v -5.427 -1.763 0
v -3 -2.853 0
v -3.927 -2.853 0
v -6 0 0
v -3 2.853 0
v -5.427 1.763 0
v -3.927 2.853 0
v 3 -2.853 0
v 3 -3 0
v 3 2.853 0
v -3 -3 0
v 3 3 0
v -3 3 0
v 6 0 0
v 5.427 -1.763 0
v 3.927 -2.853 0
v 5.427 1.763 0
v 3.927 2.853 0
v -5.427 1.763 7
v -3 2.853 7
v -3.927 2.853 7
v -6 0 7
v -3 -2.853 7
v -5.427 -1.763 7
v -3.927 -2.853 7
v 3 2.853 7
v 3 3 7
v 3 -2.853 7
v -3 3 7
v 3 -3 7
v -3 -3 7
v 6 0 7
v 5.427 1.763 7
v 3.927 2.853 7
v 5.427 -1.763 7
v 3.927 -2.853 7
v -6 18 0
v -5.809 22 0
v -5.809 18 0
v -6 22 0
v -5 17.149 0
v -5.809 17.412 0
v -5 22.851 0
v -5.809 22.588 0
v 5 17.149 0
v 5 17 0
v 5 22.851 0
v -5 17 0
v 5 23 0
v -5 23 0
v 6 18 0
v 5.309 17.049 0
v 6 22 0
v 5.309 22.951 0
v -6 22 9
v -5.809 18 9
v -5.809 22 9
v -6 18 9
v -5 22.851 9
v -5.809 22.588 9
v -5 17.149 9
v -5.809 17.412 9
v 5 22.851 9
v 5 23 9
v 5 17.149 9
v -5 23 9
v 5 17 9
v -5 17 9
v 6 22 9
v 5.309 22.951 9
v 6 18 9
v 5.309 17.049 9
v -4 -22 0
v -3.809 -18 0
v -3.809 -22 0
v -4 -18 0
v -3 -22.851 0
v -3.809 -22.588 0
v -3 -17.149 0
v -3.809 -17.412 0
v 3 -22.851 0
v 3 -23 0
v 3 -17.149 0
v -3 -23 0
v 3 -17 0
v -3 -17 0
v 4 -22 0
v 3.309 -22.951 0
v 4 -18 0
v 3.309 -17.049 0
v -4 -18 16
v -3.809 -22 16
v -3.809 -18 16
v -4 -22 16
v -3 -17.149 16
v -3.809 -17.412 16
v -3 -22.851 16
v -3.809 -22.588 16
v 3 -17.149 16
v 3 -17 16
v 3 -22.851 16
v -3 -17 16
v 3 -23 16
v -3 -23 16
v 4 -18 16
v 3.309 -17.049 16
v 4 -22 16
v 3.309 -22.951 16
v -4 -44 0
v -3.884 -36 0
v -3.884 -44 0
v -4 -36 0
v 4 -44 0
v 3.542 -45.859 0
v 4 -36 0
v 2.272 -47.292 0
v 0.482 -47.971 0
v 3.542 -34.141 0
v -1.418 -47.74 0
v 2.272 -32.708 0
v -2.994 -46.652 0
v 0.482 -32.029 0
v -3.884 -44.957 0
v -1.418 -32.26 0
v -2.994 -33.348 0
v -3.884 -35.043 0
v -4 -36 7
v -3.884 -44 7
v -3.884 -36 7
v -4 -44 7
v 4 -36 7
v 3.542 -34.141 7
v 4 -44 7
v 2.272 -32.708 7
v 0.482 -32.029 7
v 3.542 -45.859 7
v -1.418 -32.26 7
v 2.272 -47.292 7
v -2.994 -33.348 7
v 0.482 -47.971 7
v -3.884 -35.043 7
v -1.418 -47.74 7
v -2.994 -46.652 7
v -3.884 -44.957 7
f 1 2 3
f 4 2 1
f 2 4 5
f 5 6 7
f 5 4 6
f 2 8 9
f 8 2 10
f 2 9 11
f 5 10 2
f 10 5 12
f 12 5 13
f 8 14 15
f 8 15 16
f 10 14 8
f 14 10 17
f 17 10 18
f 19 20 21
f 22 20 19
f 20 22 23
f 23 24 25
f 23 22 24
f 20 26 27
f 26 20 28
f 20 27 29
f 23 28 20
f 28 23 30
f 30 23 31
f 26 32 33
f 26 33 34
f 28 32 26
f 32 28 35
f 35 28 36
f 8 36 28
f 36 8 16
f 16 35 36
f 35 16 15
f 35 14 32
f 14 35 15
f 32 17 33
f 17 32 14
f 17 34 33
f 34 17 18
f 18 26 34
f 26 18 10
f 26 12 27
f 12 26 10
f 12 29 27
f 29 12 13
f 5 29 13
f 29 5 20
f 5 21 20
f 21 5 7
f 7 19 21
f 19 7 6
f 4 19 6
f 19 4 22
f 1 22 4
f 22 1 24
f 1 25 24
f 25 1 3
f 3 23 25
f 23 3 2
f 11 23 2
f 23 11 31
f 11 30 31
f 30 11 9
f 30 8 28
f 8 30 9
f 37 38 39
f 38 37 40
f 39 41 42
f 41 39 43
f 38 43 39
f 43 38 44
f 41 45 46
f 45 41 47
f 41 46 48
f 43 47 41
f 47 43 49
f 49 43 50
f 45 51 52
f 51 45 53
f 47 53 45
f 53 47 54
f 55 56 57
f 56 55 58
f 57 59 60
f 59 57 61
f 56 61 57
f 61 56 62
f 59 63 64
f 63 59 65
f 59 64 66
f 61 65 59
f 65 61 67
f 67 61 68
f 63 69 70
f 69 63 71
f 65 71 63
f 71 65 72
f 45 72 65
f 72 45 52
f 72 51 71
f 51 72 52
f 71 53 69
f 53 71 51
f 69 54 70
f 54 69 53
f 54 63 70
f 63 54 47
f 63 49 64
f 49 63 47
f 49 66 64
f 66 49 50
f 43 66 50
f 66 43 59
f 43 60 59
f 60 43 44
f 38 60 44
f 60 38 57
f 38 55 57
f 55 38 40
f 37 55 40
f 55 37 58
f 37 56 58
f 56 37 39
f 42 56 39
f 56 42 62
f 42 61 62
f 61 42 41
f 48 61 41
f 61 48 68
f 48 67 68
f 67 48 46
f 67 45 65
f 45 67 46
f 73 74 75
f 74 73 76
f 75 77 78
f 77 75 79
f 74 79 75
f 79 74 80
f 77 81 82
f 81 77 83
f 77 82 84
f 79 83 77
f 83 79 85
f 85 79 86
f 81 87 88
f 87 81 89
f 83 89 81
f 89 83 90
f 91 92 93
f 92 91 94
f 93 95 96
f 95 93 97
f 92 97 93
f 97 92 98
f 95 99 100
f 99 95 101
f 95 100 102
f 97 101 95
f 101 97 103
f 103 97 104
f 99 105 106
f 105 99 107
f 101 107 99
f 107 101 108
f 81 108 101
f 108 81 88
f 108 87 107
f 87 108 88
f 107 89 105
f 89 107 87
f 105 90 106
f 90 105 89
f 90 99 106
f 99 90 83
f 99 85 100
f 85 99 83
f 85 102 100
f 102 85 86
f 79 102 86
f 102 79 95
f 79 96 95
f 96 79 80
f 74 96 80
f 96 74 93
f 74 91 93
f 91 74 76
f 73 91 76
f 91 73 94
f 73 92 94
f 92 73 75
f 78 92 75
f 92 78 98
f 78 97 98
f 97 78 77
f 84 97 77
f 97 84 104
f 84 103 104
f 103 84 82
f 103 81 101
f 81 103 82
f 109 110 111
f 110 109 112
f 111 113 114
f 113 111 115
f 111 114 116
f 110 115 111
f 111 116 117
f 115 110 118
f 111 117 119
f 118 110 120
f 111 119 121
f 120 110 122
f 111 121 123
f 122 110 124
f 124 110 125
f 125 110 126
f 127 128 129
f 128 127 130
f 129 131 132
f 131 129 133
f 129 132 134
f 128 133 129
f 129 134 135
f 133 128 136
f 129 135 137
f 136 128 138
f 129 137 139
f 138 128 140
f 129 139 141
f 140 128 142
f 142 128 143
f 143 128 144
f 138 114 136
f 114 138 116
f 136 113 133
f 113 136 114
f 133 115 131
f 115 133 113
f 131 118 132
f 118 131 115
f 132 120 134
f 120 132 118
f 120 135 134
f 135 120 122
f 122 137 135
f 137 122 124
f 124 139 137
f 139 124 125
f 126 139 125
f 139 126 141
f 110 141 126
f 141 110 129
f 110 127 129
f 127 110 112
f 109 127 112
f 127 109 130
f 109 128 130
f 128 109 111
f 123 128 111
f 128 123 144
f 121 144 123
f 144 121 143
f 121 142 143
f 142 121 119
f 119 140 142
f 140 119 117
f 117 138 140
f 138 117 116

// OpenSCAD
module usbc_x(
    width=12
  , depth=6
  , xyr = 3
  , height=7
  , extend_top=0
  , tunnel_angle=90
  , tunnel_extend_top=5
  , tunnel_extend_bottom=3
  , tunnel_xy_padding=1
  ) {
  xyr = min(xyr, depth / 2);
  xyr = min(xyr, width / 2);
  linear_extrude(height=height + extend_top) {
    union() {
      if (depth > 2 * xyr)
        square([width, depth - 2 * xyr], center=true);
      if (width > 2 * xyr)
        square([width - 2 * xyr, depth], center=true);
      for (cxy = [[-1, -1], [-1, 1], [1, -1], [1, 1]]) 
        translate([cxy[0] * (width / 2 - xyr), cxy[1] * (depth / 2 - xyr)])
          circle(xyr);
    }
  }
}

usbc_x(xyr=3);
translate([0, 20, 0]) usbc_x(xyr=1, extend_top=2);
translate([0, -20, 0]) usbc_x(width=8, height=16, xyr=1);
translate([0, -40, 0]) usbc_x(width=8, depth=16, xyr=10);
